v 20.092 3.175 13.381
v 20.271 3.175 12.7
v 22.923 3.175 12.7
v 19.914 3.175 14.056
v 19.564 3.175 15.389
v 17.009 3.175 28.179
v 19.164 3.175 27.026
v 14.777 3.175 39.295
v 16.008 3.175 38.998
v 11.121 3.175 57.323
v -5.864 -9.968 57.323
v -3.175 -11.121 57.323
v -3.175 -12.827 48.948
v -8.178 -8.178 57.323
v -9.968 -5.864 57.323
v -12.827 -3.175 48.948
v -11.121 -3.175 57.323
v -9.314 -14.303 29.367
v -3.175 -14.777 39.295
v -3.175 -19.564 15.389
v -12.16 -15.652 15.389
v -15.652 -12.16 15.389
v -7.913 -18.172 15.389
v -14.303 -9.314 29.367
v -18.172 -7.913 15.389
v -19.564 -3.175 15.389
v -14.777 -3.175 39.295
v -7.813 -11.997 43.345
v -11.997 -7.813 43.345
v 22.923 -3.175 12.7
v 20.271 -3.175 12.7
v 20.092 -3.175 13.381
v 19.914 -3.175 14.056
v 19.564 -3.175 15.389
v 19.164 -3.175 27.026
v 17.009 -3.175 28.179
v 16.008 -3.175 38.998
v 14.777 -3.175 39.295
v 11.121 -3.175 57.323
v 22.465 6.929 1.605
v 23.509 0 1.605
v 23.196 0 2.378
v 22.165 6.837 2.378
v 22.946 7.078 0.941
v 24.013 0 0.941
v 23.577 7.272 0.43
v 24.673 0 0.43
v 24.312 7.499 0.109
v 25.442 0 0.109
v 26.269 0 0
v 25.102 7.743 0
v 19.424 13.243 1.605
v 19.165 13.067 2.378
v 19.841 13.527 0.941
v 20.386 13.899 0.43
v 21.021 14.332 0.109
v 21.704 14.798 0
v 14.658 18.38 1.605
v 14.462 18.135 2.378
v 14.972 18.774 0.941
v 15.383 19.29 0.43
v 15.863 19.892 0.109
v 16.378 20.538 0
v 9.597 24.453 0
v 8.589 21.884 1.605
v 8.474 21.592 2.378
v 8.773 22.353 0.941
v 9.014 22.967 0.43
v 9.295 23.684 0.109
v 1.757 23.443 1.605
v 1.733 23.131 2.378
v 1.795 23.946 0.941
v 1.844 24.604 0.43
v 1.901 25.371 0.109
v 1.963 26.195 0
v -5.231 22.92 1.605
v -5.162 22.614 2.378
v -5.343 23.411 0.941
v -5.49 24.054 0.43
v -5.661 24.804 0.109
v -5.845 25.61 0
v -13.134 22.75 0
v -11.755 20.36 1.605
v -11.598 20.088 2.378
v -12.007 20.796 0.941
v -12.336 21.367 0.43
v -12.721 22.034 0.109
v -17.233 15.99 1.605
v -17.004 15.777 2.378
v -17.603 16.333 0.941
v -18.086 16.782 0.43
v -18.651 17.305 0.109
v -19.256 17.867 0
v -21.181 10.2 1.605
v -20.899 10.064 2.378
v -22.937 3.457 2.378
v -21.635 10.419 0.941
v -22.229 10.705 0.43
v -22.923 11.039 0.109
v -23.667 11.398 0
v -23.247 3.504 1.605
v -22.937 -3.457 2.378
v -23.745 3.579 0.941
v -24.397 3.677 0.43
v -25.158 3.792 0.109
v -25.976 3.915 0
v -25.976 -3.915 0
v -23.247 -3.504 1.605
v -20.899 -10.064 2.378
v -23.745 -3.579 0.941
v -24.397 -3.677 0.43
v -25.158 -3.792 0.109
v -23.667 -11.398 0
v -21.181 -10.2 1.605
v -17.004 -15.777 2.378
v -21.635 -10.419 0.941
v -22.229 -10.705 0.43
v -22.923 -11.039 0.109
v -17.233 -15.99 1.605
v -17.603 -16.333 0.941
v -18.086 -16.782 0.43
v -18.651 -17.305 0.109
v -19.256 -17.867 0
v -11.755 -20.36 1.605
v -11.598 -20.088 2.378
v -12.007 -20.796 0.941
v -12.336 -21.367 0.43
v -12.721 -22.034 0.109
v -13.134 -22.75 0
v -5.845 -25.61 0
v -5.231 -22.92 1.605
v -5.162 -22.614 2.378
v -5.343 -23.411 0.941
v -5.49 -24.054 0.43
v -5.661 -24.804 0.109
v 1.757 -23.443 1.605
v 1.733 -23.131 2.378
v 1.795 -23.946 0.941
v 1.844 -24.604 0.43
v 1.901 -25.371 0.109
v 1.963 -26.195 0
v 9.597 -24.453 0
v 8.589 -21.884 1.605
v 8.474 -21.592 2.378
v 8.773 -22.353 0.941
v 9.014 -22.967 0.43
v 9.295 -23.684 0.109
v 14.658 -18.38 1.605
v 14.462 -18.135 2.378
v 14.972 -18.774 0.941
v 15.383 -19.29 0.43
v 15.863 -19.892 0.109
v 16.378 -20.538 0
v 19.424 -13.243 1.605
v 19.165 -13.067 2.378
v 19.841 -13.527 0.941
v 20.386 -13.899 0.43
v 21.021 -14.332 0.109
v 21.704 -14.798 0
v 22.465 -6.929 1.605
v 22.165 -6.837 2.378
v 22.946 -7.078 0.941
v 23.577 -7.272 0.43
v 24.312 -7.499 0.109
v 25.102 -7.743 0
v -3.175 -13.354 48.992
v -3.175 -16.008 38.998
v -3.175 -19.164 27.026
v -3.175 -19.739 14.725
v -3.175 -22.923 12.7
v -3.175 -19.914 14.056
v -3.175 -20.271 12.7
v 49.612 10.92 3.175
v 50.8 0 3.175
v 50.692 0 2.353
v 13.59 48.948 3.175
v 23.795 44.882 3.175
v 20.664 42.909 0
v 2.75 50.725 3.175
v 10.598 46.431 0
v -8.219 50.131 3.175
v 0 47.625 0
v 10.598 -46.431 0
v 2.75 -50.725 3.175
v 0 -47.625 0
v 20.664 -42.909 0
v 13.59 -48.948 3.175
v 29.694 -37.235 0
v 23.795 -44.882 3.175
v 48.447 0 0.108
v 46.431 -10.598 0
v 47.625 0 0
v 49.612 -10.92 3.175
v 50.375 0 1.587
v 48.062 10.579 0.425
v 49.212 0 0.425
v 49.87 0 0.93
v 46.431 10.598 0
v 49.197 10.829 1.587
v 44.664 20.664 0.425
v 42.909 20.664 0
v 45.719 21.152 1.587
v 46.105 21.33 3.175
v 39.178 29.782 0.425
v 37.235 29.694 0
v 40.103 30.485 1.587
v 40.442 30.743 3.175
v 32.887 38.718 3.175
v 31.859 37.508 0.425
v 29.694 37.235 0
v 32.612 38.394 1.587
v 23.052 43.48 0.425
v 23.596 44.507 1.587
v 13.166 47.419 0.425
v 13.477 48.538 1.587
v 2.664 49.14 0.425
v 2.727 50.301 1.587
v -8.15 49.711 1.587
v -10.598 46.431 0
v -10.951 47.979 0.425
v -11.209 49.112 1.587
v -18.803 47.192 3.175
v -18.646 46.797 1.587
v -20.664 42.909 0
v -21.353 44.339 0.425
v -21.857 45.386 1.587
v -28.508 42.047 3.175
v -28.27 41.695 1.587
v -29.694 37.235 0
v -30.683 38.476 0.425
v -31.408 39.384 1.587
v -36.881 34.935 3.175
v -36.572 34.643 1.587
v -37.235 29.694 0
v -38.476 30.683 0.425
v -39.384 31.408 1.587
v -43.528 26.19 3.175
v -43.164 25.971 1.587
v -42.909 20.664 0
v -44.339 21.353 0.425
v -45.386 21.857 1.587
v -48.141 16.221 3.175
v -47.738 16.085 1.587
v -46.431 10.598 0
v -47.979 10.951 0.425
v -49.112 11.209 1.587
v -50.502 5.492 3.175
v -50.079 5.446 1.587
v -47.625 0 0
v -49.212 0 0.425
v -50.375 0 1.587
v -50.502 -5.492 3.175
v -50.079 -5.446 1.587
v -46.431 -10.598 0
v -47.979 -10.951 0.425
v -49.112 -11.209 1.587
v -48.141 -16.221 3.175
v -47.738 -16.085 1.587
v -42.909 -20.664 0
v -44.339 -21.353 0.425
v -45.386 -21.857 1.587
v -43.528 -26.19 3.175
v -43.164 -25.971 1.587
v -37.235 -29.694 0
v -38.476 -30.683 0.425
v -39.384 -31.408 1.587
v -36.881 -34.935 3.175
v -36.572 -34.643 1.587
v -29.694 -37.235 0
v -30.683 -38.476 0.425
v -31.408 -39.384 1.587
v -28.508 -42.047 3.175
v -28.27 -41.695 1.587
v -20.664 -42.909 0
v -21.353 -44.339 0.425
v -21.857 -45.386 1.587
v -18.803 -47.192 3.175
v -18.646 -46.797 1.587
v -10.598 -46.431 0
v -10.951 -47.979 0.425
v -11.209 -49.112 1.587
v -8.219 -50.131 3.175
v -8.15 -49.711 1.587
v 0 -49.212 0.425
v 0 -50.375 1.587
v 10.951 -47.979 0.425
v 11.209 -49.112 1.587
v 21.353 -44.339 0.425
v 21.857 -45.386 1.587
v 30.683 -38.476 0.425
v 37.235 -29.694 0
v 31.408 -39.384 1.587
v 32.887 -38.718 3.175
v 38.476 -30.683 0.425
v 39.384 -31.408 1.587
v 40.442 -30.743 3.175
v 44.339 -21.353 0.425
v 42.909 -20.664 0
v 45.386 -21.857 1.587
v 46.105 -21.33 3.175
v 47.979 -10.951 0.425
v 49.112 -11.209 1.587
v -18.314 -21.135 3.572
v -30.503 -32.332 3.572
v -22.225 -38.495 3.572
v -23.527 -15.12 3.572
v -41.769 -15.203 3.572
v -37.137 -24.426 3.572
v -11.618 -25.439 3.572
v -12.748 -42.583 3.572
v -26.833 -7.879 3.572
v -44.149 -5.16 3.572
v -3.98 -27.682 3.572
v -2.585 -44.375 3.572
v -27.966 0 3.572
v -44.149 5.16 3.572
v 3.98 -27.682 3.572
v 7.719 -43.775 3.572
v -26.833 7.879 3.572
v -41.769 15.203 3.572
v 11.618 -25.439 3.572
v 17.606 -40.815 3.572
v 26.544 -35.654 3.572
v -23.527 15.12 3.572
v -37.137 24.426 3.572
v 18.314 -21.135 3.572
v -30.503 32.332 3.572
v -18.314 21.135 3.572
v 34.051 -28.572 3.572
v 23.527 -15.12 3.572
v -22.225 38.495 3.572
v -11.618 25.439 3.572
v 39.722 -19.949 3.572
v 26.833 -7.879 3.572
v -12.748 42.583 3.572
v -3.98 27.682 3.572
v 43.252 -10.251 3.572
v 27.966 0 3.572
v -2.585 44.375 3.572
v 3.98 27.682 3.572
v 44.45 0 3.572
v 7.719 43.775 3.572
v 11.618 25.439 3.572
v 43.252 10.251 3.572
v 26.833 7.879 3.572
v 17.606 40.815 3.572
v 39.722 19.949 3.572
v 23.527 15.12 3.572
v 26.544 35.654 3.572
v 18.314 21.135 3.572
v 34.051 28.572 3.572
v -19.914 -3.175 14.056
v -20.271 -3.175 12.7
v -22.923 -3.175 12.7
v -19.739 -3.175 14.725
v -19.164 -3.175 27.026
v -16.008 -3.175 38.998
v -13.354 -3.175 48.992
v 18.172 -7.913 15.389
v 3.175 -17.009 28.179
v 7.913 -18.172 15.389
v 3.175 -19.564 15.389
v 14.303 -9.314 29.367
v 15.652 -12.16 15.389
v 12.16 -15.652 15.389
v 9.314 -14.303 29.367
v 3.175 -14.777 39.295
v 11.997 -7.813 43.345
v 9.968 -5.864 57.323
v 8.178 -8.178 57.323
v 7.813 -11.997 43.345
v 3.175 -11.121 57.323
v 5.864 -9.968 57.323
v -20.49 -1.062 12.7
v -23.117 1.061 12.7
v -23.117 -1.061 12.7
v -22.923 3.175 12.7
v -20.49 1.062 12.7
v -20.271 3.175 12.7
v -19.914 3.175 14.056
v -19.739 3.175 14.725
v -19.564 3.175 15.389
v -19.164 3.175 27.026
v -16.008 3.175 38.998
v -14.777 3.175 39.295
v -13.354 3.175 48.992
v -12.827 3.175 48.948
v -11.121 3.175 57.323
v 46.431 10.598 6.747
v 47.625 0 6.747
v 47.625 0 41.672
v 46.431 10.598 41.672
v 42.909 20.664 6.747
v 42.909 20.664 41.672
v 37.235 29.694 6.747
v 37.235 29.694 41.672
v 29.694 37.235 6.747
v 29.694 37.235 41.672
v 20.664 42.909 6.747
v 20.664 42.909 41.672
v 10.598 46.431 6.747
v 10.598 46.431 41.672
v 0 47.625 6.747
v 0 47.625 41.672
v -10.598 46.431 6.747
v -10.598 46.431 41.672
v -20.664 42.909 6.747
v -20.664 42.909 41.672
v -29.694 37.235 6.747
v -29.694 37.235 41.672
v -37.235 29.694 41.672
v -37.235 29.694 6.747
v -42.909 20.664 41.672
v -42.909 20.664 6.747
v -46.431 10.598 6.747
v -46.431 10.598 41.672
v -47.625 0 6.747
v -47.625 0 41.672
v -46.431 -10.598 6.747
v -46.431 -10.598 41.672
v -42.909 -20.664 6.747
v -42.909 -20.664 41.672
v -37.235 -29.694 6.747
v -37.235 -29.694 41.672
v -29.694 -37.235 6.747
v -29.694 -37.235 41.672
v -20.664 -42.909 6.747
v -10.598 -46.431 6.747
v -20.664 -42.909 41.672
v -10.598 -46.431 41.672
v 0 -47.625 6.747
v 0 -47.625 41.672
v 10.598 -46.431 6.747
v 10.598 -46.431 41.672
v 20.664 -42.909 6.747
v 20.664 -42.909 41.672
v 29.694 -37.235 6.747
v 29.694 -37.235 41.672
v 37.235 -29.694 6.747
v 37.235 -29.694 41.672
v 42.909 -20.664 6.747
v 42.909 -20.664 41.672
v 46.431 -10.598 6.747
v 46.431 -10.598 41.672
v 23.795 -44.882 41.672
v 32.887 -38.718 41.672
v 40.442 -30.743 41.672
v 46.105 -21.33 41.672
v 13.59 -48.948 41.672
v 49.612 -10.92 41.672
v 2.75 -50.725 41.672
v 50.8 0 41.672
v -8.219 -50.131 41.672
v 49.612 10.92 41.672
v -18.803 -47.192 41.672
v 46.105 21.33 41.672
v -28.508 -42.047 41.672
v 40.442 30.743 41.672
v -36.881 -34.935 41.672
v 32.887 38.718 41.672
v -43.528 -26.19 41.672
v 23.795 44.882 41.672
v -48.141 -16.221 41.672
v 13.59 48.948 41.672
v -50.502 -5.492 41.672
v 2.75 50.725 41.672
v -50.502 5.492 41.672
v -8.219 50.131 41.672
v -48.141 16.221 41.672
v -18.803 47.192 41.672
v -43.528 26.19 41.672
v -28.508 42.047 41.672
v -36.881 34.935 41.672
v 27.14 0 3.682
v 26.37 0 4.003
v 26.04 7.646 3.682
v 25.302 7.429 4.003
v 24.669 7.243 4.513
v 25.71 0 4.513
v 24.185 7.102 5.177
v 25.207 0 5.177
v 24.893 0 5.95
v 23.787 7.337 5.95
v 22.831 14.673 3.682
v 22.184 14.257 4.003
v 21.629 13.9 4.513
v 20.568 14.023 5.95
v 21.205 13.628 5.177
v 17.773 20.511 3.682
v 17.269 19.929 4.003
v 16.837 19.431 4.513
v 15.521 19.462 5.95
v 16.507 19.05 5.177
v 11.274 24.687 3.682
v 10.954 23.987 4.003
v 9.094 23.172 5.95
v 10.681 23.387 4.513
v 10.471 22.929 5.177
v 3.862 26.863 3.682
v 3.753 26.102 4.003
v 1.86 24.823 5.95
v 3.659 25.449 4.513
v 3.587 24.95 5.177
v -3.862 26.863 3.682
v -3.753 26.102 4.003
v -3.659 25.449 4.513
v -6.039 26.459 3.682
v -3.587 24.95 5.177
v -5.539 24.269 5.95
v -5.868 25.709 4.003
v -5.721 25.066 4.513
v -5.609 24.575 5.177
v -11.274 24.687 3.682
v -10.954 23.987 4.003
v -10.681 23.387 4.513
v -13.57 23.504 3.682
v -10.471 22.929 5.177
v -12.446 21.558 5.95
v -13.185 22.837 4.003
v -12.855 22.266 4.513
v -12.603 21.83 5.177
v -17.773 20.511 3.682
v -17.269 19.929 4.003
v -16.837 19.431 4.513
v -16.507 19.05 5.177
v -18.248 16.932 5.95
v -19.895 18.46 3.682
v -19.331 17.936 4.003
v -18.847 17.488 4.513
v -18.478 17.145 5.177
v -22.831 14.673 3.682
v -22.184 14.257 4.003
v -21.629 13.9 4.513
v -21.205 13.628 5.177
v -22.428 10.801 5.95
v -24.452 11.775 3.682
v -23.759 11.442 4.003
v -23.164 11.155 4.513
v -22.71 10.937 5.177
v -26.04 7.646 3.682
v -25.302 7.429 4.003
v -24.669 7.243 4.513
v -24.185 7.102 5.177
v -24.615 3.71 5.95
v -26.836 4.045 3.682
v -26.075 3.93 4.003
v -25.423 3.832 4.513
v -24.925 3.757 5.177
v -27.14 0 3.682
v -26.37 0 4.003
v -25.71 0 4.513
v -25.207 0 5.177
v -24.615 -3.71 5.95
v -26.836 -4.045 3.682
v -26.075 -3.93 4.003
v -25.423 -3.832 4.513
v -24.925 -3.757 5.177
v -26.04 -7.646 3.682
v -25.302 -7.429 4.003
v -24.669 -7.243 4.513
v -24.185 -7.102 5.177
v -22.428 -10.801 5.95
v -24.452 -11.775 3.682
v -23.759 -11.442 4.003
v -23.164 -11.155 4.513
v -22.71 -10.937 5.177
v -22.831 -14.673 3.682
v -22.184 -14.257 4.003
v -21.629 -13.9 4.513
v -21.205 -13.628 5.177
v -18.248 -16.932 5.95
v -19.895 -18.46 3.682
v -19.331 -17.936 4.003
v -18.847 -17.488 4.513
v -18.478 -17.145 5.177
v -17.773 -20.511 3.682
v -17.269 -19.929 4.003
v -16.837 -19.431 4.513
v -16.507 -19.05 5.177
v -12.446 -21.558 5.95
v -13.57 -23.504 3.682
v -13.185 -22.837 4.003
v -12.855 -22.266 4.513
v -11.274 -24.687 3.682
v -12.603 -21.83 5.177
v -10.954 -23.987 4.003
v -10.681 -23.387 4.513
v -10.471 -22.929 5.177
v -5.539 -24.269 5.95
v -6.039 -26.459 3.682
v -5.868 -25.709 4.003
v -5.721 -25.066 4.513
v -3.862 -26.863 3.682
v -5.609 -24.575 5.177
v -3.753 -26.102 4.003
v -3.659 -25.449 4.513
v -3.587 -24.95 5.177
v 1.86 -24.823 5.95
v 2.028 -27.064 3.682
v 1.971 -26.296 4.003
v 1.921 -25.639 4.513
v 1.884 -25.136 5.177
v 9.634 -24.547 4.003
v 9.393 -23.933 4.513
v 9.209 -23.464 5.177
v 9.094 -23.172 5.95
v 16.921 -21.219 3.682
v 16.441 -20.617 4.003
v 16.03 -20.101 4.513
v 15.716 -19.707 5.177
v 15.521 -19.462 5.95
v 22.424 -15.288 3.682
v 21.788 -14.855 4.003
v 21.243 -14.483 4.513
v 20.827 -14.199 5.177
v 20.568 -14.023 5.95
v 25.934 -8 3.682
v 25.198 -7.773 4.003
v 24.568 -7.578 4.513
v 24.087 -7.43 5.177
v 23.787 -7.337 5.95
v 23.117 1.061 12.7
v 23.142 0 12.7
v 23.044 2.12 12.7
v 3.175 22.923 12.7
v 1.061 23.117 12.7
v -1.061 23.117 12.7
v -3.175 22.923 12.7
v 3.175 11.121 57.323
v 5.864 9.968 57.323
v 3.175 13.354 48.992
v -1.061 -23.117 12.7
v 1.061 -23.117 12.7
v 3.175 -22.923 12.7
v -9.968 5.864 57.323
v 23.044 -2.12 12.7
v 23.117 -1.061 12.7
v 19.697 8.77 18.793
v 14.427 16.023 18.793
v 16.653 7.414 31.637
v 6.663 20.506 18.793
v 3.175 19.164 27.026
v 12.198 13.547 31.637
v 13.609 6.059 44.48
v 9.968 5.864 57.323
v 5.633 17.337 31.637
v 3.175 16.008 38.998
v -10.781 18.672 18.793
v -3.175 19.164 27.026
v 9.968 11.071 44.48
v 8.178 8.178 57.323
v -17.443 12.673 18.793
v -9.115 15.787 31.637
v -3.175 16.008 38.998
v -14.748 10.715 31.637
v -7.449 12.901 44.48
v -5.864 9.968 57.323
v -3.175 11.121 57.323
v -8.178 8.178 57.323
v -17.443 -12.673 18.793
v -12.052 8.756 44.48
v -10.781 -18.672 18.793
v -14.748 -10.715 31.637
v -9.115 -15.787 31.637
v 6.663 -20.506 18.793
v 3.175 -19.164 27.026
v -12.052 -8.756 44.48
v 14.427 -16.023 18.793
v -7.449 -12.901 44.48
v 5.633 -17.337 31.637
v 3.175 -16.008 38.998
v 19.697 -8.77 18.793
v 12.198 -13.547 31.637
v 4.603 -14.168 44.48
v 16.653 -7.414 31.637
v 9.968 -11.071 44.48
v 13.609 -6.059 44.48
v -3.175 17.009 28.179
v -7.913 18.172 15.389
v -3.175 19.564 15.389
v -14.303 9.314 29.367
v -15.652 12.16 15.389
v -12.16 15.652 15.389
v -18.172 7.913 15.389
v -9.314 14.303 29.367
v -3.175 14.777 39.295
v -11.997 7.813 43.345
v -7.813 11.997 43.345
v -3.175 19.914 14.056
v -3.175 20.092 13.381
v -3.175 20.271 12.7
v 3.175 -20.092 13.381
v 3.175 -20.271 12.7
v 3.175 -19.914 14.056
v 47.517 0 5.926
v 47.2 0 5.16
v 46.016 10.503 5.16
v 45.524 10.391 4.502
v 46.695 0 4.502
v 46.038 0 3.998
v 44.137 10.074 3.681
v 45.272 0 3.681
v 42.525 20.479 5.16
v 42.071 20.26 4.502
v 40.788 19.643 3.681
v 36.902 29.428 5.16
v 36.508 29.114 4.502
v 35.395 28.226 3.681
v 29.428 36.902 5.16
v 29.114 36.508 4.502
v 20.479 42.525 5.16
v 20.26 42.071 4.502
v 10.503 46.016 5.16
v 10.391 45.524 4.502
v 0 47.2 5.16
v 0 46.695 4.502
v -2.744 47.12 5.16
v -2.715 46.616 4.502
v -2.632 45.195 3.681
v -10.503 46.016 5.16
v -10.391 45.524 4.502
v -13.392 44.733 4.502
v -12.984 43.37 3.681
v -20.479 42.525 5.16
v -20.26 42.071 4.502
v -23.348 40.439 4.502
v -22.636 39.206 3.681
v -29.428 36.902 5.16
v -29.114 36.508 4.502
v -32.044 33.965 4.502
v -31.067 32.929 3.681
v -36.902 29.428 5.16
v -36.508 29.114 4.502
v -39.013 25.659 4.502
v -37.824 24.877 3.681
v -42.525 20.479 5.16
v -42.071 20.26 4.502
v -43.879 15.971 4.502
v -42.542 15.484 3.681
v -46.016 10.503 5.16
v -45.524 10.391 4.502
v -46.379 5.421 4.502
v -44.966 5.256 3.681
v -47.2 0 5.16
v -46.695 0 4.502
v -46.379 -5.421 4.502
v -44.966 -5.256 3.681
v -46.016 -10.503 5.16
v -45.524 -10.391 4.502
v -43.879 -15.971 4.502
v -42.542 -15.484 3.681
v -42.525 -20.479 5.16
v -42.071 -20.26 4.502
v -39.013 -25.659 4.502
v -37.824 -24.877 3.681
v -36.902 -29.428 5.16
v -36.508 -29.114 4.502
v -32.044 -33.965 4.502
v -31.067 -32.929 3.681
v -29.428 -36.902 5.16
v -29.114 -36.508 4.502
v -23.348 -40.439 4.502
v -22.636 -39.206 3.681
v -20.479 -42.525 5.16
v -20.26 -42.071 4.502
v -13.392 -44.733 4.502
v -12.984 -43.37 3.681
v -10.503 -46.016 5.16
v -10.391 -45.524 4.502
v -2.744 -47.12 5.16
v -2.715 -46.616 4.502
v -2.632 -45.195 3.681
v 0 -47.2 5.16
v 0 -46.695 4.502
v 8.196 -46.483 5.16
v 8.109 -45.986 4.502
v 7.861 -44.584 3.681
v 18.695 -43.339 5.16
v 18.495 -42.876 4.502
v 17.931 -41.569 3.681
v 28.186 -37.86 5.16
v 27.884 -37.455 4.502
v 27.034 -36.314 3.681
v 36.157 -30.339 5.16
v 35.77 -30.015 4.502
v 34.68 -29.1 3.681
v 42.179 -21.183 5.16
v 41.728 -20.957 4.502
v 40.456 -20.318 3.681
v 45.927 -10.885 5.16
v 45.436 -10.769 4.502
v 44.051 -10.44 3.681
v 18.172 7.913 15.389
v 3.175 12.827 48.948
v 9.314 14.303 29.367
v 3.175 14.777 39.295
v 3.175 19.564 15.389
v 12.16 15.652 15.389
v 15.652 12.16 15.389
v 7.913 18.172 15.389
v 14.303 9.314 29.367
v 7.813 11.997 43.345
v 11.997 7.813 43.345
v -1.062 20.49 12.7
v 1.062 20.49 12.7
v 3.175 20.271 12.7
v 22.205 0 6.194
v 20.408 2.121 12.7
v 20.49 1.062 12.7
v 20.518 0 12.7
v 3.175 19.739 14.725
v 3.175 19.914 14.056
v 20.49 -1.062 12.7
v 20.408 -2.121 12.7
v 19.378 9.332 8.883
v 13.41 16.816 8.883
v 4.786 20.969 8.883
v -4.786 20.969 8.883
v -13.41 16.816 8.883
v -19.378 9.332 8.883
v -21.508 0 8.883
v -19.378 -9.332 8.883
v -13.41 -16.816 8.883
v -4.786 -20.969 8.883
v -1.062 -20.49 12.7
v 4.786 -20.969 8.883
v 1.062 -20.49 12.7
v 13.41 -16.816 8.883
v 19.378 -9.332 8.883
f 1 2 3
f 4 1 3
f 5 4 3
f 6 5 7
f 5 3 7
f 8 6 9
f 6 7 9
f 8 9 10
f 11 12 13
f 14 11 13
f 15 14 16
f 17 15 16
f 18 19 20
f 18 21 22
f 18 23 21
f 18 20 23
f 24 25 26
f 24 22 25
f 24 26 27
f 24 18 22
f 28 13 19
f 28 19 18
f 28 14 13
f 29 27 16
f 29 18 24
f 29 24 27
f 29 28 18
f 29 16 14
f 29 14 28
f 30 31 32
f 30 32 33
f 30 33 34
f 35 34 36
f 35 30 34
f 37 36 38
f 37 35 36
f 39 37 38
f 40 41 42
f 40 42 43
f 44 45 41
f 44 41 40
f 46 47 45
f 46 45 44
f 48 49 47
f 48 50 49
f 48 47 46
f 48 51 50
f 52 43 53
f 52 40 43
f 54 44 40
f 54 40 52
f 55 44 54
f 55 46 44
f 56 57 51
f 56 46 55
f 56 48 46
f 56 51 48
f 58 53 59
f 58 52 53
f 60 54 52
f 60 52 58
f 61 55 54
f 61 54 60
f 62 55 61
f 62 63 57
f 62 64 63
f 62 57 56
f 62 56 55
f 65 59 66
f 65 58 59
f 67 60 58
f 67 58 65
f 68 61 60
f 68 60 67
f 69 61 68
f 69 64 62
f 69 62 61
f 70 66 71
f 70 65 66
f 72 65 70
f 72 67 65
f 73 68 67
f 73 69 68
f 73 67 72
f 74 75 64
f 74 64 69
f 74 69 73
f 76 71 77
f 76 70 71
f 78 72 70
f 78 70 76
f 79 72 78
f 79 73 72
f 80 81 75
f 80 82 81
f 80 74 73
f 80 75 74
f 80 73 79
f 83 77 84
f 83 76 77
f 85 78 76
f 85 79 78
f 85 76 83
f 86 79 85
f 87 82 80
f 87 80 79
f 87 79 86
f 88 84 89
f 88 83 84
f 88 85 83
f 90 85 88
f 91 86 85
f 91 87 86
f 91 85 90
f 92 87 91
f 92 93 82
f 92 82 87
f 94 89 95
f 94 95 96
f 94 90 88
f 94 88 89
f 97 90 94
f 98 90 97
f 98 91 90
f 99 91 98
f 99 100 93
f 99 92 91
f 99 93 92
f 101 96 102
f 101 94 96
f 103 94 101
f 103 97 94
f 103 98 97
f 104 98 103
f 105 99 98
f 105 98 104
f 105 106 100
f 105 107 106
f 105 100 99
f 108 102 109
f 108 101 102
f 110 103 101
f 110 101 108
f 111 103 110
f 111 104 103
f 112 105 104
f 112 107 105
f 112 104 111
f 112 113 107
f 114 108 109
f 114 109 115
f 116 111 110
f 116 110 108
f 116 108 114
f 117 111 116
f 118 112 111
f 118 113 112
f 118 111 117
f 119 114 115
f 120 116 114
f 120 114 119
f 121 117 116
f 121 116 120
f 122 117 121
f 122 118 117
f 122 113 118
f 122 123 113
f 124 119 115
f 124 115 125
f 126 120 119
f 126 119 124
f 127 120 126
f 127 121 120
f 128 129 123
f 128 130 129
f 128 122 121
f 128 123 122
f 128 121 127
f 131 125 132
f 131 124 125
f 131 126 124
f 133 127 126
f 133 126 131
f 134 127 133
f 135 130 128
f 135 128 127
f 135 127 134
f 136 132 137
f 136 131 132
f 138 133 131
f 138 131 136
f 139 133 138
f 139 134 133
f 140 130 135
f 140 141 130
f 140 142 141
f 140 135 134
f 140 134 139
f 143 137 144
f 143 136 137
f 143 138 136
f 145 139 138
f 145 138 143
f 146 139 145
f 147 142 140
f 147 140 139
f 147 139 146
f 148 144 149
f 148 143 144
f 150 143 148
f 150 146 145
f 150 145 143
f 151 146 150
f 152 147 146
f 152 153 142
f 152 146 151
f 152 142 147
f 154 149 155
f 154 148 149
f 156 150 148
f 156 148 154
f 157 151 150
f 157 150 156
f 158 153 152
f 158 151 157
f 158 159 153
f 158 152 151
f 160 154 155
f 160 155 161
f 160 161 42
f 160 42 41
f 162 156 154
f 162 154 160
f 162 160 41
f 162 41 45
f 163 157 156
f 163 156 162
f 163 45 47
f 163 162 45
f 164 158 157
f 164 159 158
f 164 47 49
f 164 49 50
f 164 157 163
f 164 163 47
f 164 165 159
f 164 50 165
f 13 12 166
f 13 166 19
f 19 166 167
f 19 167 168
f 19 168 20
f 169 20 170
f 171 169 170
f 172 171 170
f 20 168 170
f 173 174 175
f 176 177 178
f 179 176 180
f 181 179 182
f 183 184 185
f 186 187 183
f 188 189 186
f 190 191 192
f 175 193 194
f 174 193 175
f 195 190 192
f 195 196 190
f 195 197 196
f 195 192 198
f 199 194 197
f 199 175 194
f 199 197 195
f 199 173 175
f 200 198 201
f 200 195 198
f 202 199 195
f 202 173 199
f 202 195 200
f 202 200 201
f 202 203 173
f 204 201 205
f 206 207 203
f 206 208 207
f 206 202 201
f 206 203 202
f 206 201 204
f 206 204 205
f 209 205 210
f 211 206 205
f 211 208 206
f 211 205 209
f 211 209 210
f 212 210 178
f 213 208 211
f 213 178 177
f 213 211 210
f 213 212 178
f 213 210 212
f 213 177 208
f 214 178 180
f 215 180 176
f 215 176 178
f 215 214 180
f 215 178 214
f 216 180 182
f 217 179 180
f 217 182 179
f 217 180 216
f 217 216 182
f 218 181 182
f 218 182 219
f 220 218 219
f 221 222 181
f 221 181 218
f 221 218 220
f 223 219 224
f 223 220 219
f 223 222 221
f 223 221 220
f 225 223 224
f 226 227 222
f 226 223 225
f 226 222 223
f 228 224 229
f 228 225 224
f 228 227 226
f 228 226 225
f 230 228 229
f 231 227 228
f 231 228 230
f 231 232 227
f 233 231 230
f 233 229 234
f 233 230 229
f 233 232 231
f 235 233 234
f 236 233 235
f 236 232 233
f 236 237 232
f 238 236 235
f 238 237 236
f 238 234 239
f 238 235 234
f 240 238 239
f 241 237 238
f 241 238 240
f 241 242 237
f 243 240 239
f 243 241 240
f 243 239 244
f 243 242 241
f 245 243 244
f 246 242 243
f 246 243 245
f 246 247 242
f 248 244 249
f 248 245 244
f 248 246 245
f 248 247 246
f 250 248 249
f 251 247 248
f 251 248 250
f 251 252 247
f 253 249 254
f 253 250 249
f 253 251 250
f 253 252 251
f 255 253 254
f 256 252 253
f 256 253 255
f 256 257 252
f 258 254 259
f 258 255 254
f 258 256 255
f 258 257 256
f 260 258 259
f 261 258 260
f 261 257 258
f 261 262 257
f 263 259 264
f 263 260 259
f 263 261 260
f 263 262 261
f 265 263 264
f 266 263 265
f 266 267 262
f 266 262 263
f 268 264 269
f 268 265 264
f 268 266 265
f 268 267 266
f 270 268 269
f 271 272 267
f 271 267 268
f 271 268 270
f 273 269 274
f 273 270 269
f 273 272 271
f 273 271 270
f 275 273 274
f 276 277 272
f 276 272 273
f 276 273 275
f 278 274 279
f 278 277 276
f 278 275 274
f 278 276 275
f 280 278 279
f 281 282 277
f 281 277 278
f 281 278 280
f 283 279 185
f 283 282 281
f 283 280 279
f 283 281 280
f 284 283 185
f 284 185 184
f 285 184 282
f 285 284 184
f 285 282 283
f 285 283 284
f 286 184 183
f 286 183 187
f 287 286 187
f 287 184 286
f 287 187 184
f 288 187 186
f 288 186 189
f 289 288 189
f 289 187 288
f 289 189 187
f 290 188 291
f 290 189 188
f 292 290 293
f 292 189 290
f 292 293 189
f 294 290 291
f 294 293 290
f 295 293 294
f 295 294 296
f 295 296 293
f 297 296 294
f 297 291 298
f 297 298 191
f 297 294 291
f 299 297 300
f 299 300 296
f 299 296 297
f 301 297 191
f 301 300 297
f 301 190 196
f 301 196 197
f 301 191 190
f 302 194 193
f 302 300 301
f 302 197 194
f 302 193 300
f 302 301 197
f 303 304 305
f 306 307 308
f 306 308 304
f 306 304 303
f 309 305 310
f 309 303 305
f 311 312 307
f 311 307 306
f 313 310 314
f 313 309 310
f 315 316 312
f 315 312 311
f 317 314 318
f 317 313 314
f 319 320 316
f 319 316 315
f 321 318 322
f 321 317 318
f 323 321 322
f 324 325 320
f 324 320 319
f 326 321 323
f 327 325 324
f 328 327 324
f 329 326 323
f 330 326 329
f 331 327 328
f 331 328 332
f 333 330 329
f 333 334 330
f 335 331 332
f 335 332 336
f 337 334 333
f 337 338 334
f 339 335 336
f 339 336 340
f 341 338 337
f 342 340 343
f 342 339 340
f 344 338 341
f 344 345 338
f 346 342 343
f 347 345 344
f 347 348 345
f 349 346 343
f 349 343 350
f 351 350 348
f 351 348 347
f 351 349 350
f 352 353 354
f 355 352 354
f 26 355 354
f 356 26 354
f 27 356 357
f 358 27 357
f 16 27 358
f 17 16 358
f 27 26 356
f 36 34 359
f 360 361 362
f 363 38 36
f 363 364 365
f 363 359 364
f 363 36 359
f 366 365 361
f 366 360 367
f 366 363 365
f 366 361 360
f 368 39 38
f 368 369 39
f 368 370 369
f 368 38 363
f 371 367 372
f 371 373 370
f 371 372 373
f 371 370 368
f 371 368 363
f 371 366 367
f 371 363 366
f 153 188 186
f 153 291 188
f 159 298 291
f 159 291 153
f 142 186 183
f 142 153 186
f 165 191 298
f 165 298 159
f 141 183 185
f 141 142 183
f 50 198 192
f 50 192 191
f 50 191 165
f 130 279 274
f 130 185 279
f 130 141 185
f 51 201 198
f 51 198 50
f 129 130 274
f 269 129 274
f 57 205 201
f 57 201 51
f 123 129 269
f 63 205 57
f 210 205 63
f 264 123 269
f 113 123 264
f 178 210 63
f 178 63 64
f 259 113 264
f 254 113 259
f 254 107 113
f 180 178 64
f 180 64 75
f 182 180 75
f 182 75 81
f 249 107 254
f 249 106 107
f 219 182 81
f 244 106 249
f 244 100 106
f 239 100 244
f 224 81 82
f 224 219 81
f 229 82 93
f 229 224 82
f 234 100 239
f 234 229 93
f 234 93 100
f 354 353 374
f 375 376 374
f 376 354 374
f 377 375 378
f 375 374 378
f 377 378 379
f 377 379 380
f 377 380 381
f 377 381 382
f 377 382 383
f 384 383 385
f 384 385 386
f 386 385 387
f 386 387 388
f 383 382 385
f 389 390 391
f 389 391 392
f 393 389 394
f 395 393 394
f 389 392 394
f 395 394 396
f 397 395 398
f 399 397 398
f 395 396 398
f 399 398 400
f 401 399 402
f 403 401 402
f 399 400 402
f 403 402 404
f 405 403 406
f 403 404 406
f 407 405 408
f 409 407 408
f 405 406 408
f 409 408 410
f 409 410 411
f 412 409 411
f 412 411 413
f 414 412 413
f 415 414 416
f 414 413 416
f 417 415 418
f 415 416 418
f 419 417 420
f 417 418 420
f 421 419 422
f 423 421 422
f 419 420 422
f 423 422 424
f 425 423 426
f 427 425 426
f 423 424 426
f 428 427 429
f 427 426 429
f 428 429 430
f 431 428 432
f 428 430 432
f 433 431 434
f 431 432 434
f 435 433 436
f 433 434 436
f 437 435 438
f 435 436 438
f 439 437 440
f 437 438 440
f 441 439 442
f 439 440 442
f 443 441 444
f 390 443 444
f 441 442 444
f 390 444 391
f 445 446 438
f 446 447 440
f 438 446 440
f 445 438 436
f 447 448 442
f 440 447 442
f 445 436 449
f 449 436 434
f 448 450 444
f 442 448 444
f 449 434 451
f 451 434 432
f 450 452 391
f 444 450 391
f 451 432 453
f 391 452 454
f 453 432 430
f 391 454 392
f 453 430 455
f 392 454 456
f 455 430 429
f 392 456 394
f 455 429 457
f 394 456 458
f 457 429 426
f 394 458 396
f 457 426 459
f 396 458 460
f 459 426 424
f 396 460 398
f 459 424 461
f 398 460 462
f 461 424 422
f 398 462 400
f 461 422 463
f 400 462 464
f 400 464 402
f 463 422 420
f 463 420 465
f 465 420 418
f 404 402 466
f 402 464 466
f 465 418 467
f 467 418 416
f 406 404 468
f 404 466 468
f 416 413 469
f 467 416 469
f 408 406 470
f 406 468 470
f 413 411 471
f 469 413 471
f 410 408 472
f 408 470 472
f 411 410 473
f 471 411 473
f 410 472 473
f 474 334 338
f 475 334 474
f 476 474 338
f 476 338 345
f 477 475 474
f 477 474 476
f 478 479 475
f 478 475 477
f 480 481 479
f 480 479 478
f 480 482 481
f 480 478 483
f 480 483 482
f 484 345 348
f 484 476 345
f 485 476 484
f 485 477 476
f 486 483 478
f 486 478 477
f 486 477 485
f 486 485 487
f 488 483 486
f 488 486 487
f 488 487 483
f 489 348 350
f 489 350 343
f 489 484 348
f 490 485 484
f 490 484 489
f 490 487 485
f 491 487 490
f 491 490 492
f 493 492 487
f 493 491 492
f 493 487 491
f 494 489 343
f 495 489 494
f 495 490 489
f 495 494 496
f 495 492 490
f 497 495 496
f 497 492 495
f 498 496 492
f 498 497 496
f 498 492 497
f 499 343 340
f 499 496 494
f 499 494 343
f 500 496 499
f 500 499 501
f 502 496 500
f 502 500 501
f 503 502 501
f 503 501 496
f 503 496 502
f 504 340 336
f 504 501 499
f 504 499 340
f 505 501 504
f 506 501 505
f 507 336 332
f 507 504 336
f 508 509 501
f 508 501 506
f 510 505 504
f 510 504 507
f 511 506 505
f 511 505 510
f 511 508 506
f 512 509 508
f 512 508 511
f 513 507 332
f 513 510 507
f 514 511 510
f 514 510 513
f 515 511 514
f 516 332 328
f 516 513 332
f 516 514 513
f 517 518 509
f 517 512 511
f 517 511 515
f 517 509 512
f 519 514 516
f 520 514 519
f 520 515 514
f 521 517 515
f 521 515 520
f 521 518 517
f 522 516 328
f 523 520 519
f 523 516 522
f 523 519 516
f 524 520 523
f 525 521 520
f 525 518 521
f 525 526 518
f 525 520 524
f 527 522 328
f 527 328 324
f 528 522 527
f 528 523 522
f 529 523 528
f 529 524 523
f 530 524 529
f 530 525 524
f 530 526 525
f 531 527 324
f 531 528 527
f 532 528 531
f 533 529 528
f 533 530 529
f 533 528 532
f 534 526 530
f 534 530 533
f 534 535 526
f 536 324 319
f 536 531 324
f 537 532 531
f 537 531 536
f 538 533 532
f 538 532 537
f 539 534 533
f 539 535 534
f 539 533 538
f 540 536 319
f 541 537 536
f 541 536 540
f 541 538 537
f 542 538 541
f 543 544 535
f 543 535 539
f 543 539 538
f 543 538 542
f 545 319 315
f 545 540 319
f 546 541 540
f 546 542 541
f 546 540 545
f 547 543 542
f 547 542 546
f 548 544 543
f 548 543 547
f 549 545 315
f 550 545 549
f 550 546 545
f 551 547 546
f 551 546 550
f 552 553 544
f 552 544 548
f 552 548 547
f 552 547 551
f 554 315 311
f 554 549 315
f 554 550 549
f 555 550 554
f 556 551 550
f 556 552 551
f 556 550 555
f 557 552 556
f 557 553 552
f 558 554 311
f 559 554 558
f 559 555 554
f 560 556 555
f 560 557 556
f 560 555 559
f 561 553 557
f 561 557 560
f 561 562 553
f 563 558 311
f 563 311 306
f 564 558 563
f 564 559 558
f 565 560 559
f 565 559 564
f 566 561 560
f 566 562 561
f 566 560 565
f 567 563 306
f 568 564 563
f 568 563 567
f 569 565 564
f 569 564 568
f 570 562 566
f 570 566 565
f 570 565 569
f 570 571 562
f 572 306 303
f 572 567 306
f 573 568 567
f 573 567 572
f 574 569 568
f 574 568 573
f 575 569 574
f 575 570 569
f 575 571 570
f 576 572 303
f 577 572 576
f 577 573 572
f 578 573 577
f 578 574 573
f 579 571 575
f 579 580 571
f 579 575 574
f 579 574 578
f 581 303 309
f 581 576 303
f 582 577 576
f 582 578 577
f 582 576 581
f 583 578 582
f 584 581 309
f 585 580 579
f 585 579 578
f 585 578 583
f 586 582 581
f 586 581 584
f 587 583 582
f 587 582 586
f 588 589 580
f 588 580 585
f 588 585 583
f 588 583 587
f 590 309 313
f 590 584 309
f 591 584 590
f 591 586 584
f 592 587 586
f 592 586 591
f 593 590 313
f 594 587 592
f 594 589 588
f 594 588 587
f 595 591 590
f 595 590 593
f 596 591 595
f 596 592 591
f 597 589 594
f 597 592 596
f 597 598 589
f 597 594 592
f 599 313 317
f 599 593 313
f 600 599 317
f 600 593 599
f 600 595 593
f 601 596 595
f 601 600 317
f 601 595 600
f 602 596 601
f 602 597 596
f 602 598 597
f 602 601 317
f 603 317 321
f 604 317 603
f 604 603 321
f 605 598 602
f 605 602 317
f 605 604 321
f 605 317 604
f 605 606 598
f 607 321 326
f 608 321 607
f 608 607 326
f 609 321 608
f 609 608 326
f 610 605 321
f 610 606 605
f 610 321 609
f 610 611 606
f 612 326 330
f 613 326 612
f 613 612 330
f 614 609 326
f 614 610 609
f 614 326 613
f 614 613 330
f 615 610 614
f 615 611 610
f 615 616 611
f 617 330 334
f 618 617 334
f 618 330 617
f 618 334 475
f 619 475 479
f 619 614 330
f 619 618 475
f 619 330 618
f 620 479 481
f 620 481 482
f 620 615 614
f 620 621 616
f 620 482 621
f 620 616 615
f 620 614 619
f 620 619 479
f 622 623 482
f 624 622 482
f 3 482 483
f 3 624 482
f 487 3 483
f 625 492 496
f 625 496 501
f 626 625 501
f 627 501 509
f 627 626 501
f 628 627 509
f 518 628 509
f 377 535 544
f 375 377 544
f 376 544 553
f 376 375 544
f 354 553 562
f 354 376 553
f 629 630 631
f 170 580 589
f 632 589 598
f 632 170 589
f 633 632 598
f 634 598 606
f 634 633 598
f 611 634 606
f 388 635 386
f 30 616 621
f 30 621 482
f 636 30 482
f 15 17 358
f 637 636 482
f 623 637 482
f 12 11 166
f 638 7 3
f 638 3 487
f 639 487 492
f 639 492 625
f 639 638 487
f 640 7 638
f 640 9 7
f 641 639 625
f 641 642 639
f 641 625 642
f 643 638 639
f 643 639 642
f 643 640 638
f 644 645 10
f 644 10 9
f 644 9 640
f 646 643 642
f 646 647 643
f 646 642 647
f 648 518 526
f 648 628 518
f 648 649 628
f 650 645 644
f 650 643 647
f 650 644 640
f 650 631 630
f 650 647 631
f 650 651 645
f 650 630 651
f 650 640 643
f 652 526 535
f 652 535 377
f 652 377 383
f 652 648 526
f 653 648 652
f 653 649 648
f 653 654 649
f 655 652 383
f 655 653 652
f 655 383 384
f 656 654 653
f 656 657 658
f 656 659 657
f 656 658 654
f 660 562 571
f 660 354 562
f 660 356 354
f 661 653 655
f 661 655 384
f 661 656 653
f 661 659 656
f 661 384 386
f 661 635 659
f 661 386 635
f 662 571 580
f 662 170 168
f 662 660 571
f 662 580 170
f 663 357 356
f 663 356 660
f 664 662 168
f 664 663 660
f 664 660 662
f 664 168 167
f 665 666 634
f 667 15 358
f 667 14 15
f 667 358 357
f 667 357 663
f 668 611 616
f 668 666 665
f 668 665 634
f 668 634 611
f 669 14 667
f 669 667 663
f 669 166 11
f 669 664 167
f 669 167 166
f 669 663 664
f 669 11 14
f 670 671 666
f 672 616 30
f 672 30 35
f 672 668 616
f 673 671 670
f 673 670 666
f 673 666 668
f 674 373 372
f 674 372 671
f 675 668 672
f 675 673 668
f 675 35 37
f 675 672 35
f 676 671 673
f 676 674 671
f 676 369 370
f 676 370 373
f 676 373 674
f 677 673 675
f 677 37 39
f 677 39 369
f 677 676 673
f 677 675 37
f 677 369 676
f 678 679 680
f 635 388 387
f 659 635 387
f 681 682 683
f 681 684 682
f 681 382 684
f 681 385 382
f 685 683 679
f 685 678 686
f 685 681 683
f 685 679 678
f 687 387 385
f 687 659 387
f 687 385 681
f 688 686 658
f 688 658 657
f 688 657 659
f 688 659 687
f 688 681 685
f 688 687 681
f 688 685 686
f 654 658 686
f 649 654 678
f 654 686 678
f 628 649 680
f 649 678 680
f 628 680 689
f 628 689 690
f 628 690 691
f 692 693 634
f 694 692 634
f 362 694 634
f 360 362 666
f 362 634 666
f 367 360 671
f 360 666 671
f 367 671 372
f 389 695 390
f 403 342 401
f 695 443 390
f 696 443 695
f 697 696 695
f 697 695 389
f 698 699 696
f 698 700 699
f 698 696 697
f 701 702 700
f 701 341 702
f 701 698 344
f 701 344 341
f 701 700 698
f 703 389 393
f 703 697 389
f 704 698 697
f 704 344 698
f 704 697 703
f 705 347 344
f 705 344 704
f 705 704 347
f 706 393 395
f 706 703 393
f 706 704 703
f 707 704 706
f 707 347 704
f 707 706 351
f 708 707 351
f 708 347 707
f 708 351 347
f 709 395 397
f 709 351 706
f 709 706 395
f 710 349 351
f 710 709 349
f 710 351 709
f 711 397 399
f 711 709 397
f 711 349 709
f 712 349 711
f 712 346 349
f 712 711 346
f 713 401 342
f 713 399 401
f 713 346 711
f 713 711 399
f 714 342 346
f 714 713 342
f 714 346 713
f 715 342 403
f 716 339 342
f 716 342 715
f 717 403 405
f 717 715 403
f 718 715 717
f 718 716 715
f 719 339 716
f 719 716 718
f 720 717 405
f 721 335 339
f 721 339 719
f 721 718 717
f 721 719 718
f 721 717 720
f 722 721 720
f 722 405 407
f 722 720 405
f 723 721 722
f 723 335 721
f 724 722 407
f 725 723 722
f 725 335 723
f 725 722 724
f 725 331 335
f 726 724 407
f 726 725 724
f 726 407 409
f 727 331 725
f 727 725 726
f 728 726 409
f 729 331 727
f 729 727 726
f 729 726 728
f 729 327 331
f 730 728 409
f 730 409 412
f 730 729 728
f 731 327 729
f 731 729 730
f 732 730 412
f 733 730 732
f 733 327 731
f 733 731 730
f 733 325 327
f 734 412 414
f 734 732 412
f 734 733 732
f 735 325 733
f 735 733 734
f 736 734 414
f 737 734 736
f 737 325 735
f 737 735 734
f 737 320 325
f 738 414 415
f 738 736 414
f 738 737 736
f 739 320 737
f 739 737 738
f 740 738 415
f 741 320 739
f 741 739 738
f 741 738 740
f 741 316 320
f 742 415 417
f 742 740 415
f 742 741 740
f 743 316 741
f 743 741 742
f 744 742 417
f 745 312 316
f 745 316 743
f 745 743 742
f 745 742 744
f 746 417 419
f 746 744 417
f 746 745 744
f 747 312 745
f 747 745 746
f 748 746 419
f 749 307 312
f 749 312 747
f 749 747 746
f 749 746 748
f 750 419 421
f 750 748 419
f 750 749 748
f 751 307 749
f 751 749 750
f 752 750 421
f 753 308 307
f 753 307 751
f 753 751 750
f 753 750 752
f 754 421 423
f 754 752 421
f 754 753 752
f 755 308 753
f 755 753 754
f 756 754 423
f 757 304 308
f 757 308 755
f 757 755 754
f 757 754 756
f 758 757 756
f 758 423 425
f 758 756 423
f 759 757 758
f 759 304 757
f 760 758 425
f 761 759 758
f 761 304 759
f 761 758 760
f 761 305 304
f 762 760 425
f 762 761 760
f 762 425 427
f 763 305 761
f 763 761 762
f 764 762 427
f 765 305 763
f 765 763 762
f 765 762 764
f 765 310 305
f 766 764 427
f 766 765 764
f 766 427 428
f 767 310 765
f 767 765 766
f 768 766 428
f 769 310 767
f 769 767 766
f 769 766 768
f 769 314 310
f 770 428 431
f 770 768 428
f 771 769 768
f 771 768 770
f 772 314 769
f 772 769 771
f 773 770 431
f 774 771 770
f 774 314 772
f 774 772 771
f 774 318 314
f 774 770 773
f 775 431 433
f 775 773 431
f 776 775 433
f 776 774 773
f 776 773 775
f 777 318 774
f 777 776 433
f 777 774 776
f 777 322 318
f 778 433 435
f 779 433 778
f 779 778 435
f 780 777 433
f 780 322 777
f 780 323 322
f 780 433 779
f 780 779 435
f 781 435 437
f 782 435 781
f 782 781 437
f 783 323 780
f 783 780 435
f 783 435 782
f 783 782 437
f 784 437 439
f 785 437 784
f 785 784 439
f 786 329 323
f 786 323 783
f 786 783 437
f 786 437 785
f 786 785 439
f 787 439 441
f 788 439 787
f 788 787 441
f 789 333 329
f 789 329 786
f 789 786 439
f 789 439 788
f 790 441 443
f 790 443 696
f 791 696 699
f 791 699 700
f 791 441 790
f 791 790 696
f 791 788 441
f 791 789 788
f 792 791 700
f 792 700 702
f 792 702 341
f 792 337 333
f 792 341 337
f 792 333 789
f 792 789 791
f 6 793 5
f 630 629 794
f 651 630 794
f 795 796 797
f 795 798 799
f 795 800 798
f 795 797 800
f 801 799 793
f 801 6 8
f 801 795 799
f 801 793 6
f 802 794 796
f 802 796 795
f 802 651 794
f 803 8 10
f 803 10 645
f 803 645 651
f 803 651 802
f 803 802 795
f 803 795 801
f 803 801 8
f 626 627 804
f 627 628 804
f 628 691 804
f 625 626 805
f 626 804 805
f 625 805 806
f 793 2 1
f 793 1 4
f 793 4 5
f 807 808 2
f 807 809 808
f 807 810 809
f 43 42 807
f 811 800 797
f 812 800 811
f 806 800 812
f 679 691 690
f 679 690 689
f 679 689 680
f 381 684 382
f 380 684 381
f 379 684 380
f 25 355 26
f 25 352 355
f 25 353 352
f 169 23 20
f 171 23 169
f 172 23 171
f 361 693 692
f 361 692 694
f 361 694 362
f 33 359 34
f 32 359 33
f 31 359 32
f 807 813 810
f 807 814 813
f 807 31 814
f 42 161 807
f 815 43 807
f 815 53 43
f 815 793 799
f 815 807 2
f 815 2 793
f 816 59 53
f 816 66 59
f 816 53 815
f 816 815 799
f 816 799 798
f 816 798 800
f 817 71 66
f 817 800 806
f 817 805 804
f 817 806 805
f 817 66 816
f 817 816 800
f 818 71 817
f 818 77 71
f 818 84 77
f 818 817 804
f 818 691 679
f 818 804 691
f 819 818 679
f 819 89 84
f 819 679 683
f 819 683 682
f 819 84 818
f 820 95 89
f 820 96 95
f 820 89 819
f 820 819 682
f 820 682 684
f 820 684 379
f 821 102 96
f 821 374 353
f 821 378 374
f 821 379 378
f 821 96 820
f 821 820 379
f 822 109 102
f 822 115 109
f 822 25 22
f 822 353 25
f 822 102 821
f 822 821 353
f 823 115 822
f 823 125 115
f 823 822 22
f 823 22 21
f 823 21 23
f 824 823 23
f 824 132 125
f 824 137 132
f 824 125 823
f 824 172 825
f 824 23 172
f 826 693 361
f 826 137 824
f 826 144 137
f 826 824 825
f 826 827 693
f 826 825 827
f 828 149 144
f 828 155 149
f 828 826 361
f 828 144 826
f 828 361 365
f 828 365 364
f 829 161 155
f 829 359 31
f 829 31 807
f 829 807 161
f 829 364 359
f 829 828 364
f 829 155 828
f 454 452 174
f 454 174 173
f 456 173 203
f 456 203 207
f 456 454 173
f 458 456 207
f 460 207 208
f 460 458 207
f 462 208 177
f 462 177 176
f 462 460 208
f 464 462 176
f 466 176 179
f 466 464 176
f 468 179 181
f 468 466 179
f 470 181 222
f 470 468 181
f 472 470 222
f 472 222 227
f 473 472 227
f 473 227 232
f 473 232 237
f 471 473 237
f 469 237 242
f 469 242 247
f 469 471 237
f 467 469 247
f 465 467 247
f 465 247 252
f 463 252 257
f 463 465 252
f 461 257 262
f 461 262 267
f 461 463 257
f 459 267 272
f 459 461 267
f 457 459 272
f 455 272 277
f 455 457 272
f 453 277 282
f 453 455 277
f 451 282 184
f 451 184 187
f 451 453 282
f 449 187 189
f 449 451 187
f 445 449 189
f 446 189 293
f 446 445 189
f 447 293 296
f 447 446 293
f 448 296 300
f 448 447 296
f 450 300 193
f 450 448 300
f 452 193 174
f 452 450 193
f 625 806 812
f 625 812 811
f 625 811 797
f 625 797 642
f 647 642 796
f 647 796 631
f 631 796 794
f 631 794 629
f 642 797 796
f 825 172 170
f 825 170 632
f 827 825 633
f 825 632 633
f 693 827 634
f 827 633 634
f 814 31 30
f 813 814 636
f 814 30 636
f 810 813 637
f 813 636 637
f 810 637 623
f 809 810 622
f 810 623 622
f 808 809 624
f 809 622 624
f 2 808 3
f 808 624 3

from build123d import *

# Parameters (mm, degrees)
F0_W         = 3.175
F0_H         = 38.1
F3_R         = 3.175
F4_W         = 3.175
F4_H         = 55.6163180947
F5_DEPTH     = 30.734
F6_W         = 3.175
F6_H         = 64.323036778
F7_DEPTH     = 27.178
F8_R         = 11.5282463958
F9_DEPTH     = 72.136
F10_T2_ANGLE = 359.64
F10_T4_ANGLE = 359.64
F10_T6_ANGLE = 359.64
F10_T8_ANGLE = 359.64


# Not quite as in the source:
# - a fillet or chamfer that OpenCascade refuses, or shapes differently, is made with other operations: its cross-section is extruded or revolved along the edge and cut away or added


with BuildPart() as f2:
    # F0 (on Front) → F2 (revolve)
    with BuildSketch(Plane.XZ):
        Polygon((7.1327639744, 64.2934367061), (23.8125, 0), (23.8125, 3.5723163746), (25.5098140885, 3.5723163746), (9.5913732515, 64.9312771426), align=None)
        Polygon((23.8125, 3.5723163746), (23.8125, 0), (50.8, 0), (50.8, 3.5723163746), (47.625, 3.5723163746), (25.5098140885, 3.5723163746), align=None)
        with Locations((49.2125, 22.6223163746)):
            Rectangle(F0_W, F0_H)
    revolve(axis=Axis((0, 0, 38.2007025182), (0, 0, 1)))

    # F3
    f3_edges = [f2.edges().sort_by_distance(p)[0] for p in [
        (-50.8, 0, 0),
        (-23.8125, 0, 0),
        (-25.509814, 0, 3.572316),
        (-47.625, 0, 3.572316),
    ]]
    fillet(f3_edges, radius=F3_R)

    # F4 (on Front) → F5 (cut, symmetric)
    with BuildSketch(Plane.XZ):
        with Locations((1.5875, 40.5081590474)):
            Rectangle(F4_W, F4_H)
        Polygon((-3.175, 12.7), (0, 12.7), (0, 68.3163180947), (0, 68.3765411377), (-3.175, 68.3765411377), align=None)
    extrude(amount=F5_DEPTH, both=True, mode=Mode.SUBTRACT)

    # F6 (on Right) → F7 (cut, symmetric)
    with BuildSketch(Plane.YZ):
        Polygon((0, 77.023036778), (0, 12.7), (3.175, 12.7), (3.175, 80.2117586136), (0, 80.2117586136), align=None)
        with Locations((-1.5875, 44.861518389)):
            Rectangle(F6_W, F6_H)
    extrude(amount=F7_DEPTH, both=True, mode=Mode.SUBTRACT)

    # F8 (on Top) → F9 (cut)
    with BuildSketch(Plane.XY):
        Circle(F8_R)
    extrude(amount=F9_DEPTH, mode=Mode.SUBTRACT)

    # F10: chamfer of 10.16 x 33.02 on 4 edges, made by hand

    # F10_s1 → F10_t2 (revolve, cut)
    with BuildSketch(Plane(origin=(0, 0, 0), x_dir=(0, 0, 1), z_dir=(-0.7093247296, -0.7048818539, 0))):
        Polygon((15.3887617085, 19.8201720703), (57.5106823112, 11.5282463958), (47.3506823112, 11.5282463958), align=None)
    revolve(axis=Axis((0, 0, 47.3506823112), (0, 0, -1)), revolution_arc=F10_T2_ANGLE, mode=Mode.SUBTRACT)

    # F10_s3 → F10_t4 (revolve, cut)
    with BuildSketch(Plane(origin=(0, 0, 0), x_dir=(0, 0, 1), z_dir=(-0.7048818539, 0.7093247296, 0))):
        Polygon((15.3887617085, 19.8201720703), (57.5106823112, 11.5282463958), (47.3506823112, 11.5282463958), align=None)
    revolve(axis=Axis((0, 0, 47.3506823112), (0, 0, -1)), revolution_arc=F10_T4_ANGLE, mode=Mode.SUBTRACT)

    # F10_s5 → F10_t6 (revolve, cut)
    with BuildSketch(Plane(origin=(0, 0, 0), x_dir=(0, 0, 1), z_dir=(0.7093247296, 0.7048818539, 0))):
        Polygon((15.3887617085, 19.8201720703), (57.5106823112, 11.5282463958), (47.3506823112, 11.5282463958), align=None)
    revolve(axis=Axis((0, 0, 47.3506823112), (0, 0, -1)), revolution_arc=F10_T6_ANGLE, mode=Mode.SUBTRACT)

    # F10_s7 → F10_t8 (revolve, cut)
    with BuildSketch(Plane(origin=(0, 0, 0), x_dir=(0, 0, 1), z_dir=(0.7048818539, -0.7093247296, 0))):
        Polygon((15.3887617085, 19.8201720703), (57.5106823112, 11.5282463958), (47.3506823112, 11.5282463958), align=None)
    revolve(axis=Axis((0, 0, 47.3506823112), (0, 0, -1)), revolution_arc=F10_T8_ANGLE, mode=Mode.SUBTRACT)


solid = f2.part
